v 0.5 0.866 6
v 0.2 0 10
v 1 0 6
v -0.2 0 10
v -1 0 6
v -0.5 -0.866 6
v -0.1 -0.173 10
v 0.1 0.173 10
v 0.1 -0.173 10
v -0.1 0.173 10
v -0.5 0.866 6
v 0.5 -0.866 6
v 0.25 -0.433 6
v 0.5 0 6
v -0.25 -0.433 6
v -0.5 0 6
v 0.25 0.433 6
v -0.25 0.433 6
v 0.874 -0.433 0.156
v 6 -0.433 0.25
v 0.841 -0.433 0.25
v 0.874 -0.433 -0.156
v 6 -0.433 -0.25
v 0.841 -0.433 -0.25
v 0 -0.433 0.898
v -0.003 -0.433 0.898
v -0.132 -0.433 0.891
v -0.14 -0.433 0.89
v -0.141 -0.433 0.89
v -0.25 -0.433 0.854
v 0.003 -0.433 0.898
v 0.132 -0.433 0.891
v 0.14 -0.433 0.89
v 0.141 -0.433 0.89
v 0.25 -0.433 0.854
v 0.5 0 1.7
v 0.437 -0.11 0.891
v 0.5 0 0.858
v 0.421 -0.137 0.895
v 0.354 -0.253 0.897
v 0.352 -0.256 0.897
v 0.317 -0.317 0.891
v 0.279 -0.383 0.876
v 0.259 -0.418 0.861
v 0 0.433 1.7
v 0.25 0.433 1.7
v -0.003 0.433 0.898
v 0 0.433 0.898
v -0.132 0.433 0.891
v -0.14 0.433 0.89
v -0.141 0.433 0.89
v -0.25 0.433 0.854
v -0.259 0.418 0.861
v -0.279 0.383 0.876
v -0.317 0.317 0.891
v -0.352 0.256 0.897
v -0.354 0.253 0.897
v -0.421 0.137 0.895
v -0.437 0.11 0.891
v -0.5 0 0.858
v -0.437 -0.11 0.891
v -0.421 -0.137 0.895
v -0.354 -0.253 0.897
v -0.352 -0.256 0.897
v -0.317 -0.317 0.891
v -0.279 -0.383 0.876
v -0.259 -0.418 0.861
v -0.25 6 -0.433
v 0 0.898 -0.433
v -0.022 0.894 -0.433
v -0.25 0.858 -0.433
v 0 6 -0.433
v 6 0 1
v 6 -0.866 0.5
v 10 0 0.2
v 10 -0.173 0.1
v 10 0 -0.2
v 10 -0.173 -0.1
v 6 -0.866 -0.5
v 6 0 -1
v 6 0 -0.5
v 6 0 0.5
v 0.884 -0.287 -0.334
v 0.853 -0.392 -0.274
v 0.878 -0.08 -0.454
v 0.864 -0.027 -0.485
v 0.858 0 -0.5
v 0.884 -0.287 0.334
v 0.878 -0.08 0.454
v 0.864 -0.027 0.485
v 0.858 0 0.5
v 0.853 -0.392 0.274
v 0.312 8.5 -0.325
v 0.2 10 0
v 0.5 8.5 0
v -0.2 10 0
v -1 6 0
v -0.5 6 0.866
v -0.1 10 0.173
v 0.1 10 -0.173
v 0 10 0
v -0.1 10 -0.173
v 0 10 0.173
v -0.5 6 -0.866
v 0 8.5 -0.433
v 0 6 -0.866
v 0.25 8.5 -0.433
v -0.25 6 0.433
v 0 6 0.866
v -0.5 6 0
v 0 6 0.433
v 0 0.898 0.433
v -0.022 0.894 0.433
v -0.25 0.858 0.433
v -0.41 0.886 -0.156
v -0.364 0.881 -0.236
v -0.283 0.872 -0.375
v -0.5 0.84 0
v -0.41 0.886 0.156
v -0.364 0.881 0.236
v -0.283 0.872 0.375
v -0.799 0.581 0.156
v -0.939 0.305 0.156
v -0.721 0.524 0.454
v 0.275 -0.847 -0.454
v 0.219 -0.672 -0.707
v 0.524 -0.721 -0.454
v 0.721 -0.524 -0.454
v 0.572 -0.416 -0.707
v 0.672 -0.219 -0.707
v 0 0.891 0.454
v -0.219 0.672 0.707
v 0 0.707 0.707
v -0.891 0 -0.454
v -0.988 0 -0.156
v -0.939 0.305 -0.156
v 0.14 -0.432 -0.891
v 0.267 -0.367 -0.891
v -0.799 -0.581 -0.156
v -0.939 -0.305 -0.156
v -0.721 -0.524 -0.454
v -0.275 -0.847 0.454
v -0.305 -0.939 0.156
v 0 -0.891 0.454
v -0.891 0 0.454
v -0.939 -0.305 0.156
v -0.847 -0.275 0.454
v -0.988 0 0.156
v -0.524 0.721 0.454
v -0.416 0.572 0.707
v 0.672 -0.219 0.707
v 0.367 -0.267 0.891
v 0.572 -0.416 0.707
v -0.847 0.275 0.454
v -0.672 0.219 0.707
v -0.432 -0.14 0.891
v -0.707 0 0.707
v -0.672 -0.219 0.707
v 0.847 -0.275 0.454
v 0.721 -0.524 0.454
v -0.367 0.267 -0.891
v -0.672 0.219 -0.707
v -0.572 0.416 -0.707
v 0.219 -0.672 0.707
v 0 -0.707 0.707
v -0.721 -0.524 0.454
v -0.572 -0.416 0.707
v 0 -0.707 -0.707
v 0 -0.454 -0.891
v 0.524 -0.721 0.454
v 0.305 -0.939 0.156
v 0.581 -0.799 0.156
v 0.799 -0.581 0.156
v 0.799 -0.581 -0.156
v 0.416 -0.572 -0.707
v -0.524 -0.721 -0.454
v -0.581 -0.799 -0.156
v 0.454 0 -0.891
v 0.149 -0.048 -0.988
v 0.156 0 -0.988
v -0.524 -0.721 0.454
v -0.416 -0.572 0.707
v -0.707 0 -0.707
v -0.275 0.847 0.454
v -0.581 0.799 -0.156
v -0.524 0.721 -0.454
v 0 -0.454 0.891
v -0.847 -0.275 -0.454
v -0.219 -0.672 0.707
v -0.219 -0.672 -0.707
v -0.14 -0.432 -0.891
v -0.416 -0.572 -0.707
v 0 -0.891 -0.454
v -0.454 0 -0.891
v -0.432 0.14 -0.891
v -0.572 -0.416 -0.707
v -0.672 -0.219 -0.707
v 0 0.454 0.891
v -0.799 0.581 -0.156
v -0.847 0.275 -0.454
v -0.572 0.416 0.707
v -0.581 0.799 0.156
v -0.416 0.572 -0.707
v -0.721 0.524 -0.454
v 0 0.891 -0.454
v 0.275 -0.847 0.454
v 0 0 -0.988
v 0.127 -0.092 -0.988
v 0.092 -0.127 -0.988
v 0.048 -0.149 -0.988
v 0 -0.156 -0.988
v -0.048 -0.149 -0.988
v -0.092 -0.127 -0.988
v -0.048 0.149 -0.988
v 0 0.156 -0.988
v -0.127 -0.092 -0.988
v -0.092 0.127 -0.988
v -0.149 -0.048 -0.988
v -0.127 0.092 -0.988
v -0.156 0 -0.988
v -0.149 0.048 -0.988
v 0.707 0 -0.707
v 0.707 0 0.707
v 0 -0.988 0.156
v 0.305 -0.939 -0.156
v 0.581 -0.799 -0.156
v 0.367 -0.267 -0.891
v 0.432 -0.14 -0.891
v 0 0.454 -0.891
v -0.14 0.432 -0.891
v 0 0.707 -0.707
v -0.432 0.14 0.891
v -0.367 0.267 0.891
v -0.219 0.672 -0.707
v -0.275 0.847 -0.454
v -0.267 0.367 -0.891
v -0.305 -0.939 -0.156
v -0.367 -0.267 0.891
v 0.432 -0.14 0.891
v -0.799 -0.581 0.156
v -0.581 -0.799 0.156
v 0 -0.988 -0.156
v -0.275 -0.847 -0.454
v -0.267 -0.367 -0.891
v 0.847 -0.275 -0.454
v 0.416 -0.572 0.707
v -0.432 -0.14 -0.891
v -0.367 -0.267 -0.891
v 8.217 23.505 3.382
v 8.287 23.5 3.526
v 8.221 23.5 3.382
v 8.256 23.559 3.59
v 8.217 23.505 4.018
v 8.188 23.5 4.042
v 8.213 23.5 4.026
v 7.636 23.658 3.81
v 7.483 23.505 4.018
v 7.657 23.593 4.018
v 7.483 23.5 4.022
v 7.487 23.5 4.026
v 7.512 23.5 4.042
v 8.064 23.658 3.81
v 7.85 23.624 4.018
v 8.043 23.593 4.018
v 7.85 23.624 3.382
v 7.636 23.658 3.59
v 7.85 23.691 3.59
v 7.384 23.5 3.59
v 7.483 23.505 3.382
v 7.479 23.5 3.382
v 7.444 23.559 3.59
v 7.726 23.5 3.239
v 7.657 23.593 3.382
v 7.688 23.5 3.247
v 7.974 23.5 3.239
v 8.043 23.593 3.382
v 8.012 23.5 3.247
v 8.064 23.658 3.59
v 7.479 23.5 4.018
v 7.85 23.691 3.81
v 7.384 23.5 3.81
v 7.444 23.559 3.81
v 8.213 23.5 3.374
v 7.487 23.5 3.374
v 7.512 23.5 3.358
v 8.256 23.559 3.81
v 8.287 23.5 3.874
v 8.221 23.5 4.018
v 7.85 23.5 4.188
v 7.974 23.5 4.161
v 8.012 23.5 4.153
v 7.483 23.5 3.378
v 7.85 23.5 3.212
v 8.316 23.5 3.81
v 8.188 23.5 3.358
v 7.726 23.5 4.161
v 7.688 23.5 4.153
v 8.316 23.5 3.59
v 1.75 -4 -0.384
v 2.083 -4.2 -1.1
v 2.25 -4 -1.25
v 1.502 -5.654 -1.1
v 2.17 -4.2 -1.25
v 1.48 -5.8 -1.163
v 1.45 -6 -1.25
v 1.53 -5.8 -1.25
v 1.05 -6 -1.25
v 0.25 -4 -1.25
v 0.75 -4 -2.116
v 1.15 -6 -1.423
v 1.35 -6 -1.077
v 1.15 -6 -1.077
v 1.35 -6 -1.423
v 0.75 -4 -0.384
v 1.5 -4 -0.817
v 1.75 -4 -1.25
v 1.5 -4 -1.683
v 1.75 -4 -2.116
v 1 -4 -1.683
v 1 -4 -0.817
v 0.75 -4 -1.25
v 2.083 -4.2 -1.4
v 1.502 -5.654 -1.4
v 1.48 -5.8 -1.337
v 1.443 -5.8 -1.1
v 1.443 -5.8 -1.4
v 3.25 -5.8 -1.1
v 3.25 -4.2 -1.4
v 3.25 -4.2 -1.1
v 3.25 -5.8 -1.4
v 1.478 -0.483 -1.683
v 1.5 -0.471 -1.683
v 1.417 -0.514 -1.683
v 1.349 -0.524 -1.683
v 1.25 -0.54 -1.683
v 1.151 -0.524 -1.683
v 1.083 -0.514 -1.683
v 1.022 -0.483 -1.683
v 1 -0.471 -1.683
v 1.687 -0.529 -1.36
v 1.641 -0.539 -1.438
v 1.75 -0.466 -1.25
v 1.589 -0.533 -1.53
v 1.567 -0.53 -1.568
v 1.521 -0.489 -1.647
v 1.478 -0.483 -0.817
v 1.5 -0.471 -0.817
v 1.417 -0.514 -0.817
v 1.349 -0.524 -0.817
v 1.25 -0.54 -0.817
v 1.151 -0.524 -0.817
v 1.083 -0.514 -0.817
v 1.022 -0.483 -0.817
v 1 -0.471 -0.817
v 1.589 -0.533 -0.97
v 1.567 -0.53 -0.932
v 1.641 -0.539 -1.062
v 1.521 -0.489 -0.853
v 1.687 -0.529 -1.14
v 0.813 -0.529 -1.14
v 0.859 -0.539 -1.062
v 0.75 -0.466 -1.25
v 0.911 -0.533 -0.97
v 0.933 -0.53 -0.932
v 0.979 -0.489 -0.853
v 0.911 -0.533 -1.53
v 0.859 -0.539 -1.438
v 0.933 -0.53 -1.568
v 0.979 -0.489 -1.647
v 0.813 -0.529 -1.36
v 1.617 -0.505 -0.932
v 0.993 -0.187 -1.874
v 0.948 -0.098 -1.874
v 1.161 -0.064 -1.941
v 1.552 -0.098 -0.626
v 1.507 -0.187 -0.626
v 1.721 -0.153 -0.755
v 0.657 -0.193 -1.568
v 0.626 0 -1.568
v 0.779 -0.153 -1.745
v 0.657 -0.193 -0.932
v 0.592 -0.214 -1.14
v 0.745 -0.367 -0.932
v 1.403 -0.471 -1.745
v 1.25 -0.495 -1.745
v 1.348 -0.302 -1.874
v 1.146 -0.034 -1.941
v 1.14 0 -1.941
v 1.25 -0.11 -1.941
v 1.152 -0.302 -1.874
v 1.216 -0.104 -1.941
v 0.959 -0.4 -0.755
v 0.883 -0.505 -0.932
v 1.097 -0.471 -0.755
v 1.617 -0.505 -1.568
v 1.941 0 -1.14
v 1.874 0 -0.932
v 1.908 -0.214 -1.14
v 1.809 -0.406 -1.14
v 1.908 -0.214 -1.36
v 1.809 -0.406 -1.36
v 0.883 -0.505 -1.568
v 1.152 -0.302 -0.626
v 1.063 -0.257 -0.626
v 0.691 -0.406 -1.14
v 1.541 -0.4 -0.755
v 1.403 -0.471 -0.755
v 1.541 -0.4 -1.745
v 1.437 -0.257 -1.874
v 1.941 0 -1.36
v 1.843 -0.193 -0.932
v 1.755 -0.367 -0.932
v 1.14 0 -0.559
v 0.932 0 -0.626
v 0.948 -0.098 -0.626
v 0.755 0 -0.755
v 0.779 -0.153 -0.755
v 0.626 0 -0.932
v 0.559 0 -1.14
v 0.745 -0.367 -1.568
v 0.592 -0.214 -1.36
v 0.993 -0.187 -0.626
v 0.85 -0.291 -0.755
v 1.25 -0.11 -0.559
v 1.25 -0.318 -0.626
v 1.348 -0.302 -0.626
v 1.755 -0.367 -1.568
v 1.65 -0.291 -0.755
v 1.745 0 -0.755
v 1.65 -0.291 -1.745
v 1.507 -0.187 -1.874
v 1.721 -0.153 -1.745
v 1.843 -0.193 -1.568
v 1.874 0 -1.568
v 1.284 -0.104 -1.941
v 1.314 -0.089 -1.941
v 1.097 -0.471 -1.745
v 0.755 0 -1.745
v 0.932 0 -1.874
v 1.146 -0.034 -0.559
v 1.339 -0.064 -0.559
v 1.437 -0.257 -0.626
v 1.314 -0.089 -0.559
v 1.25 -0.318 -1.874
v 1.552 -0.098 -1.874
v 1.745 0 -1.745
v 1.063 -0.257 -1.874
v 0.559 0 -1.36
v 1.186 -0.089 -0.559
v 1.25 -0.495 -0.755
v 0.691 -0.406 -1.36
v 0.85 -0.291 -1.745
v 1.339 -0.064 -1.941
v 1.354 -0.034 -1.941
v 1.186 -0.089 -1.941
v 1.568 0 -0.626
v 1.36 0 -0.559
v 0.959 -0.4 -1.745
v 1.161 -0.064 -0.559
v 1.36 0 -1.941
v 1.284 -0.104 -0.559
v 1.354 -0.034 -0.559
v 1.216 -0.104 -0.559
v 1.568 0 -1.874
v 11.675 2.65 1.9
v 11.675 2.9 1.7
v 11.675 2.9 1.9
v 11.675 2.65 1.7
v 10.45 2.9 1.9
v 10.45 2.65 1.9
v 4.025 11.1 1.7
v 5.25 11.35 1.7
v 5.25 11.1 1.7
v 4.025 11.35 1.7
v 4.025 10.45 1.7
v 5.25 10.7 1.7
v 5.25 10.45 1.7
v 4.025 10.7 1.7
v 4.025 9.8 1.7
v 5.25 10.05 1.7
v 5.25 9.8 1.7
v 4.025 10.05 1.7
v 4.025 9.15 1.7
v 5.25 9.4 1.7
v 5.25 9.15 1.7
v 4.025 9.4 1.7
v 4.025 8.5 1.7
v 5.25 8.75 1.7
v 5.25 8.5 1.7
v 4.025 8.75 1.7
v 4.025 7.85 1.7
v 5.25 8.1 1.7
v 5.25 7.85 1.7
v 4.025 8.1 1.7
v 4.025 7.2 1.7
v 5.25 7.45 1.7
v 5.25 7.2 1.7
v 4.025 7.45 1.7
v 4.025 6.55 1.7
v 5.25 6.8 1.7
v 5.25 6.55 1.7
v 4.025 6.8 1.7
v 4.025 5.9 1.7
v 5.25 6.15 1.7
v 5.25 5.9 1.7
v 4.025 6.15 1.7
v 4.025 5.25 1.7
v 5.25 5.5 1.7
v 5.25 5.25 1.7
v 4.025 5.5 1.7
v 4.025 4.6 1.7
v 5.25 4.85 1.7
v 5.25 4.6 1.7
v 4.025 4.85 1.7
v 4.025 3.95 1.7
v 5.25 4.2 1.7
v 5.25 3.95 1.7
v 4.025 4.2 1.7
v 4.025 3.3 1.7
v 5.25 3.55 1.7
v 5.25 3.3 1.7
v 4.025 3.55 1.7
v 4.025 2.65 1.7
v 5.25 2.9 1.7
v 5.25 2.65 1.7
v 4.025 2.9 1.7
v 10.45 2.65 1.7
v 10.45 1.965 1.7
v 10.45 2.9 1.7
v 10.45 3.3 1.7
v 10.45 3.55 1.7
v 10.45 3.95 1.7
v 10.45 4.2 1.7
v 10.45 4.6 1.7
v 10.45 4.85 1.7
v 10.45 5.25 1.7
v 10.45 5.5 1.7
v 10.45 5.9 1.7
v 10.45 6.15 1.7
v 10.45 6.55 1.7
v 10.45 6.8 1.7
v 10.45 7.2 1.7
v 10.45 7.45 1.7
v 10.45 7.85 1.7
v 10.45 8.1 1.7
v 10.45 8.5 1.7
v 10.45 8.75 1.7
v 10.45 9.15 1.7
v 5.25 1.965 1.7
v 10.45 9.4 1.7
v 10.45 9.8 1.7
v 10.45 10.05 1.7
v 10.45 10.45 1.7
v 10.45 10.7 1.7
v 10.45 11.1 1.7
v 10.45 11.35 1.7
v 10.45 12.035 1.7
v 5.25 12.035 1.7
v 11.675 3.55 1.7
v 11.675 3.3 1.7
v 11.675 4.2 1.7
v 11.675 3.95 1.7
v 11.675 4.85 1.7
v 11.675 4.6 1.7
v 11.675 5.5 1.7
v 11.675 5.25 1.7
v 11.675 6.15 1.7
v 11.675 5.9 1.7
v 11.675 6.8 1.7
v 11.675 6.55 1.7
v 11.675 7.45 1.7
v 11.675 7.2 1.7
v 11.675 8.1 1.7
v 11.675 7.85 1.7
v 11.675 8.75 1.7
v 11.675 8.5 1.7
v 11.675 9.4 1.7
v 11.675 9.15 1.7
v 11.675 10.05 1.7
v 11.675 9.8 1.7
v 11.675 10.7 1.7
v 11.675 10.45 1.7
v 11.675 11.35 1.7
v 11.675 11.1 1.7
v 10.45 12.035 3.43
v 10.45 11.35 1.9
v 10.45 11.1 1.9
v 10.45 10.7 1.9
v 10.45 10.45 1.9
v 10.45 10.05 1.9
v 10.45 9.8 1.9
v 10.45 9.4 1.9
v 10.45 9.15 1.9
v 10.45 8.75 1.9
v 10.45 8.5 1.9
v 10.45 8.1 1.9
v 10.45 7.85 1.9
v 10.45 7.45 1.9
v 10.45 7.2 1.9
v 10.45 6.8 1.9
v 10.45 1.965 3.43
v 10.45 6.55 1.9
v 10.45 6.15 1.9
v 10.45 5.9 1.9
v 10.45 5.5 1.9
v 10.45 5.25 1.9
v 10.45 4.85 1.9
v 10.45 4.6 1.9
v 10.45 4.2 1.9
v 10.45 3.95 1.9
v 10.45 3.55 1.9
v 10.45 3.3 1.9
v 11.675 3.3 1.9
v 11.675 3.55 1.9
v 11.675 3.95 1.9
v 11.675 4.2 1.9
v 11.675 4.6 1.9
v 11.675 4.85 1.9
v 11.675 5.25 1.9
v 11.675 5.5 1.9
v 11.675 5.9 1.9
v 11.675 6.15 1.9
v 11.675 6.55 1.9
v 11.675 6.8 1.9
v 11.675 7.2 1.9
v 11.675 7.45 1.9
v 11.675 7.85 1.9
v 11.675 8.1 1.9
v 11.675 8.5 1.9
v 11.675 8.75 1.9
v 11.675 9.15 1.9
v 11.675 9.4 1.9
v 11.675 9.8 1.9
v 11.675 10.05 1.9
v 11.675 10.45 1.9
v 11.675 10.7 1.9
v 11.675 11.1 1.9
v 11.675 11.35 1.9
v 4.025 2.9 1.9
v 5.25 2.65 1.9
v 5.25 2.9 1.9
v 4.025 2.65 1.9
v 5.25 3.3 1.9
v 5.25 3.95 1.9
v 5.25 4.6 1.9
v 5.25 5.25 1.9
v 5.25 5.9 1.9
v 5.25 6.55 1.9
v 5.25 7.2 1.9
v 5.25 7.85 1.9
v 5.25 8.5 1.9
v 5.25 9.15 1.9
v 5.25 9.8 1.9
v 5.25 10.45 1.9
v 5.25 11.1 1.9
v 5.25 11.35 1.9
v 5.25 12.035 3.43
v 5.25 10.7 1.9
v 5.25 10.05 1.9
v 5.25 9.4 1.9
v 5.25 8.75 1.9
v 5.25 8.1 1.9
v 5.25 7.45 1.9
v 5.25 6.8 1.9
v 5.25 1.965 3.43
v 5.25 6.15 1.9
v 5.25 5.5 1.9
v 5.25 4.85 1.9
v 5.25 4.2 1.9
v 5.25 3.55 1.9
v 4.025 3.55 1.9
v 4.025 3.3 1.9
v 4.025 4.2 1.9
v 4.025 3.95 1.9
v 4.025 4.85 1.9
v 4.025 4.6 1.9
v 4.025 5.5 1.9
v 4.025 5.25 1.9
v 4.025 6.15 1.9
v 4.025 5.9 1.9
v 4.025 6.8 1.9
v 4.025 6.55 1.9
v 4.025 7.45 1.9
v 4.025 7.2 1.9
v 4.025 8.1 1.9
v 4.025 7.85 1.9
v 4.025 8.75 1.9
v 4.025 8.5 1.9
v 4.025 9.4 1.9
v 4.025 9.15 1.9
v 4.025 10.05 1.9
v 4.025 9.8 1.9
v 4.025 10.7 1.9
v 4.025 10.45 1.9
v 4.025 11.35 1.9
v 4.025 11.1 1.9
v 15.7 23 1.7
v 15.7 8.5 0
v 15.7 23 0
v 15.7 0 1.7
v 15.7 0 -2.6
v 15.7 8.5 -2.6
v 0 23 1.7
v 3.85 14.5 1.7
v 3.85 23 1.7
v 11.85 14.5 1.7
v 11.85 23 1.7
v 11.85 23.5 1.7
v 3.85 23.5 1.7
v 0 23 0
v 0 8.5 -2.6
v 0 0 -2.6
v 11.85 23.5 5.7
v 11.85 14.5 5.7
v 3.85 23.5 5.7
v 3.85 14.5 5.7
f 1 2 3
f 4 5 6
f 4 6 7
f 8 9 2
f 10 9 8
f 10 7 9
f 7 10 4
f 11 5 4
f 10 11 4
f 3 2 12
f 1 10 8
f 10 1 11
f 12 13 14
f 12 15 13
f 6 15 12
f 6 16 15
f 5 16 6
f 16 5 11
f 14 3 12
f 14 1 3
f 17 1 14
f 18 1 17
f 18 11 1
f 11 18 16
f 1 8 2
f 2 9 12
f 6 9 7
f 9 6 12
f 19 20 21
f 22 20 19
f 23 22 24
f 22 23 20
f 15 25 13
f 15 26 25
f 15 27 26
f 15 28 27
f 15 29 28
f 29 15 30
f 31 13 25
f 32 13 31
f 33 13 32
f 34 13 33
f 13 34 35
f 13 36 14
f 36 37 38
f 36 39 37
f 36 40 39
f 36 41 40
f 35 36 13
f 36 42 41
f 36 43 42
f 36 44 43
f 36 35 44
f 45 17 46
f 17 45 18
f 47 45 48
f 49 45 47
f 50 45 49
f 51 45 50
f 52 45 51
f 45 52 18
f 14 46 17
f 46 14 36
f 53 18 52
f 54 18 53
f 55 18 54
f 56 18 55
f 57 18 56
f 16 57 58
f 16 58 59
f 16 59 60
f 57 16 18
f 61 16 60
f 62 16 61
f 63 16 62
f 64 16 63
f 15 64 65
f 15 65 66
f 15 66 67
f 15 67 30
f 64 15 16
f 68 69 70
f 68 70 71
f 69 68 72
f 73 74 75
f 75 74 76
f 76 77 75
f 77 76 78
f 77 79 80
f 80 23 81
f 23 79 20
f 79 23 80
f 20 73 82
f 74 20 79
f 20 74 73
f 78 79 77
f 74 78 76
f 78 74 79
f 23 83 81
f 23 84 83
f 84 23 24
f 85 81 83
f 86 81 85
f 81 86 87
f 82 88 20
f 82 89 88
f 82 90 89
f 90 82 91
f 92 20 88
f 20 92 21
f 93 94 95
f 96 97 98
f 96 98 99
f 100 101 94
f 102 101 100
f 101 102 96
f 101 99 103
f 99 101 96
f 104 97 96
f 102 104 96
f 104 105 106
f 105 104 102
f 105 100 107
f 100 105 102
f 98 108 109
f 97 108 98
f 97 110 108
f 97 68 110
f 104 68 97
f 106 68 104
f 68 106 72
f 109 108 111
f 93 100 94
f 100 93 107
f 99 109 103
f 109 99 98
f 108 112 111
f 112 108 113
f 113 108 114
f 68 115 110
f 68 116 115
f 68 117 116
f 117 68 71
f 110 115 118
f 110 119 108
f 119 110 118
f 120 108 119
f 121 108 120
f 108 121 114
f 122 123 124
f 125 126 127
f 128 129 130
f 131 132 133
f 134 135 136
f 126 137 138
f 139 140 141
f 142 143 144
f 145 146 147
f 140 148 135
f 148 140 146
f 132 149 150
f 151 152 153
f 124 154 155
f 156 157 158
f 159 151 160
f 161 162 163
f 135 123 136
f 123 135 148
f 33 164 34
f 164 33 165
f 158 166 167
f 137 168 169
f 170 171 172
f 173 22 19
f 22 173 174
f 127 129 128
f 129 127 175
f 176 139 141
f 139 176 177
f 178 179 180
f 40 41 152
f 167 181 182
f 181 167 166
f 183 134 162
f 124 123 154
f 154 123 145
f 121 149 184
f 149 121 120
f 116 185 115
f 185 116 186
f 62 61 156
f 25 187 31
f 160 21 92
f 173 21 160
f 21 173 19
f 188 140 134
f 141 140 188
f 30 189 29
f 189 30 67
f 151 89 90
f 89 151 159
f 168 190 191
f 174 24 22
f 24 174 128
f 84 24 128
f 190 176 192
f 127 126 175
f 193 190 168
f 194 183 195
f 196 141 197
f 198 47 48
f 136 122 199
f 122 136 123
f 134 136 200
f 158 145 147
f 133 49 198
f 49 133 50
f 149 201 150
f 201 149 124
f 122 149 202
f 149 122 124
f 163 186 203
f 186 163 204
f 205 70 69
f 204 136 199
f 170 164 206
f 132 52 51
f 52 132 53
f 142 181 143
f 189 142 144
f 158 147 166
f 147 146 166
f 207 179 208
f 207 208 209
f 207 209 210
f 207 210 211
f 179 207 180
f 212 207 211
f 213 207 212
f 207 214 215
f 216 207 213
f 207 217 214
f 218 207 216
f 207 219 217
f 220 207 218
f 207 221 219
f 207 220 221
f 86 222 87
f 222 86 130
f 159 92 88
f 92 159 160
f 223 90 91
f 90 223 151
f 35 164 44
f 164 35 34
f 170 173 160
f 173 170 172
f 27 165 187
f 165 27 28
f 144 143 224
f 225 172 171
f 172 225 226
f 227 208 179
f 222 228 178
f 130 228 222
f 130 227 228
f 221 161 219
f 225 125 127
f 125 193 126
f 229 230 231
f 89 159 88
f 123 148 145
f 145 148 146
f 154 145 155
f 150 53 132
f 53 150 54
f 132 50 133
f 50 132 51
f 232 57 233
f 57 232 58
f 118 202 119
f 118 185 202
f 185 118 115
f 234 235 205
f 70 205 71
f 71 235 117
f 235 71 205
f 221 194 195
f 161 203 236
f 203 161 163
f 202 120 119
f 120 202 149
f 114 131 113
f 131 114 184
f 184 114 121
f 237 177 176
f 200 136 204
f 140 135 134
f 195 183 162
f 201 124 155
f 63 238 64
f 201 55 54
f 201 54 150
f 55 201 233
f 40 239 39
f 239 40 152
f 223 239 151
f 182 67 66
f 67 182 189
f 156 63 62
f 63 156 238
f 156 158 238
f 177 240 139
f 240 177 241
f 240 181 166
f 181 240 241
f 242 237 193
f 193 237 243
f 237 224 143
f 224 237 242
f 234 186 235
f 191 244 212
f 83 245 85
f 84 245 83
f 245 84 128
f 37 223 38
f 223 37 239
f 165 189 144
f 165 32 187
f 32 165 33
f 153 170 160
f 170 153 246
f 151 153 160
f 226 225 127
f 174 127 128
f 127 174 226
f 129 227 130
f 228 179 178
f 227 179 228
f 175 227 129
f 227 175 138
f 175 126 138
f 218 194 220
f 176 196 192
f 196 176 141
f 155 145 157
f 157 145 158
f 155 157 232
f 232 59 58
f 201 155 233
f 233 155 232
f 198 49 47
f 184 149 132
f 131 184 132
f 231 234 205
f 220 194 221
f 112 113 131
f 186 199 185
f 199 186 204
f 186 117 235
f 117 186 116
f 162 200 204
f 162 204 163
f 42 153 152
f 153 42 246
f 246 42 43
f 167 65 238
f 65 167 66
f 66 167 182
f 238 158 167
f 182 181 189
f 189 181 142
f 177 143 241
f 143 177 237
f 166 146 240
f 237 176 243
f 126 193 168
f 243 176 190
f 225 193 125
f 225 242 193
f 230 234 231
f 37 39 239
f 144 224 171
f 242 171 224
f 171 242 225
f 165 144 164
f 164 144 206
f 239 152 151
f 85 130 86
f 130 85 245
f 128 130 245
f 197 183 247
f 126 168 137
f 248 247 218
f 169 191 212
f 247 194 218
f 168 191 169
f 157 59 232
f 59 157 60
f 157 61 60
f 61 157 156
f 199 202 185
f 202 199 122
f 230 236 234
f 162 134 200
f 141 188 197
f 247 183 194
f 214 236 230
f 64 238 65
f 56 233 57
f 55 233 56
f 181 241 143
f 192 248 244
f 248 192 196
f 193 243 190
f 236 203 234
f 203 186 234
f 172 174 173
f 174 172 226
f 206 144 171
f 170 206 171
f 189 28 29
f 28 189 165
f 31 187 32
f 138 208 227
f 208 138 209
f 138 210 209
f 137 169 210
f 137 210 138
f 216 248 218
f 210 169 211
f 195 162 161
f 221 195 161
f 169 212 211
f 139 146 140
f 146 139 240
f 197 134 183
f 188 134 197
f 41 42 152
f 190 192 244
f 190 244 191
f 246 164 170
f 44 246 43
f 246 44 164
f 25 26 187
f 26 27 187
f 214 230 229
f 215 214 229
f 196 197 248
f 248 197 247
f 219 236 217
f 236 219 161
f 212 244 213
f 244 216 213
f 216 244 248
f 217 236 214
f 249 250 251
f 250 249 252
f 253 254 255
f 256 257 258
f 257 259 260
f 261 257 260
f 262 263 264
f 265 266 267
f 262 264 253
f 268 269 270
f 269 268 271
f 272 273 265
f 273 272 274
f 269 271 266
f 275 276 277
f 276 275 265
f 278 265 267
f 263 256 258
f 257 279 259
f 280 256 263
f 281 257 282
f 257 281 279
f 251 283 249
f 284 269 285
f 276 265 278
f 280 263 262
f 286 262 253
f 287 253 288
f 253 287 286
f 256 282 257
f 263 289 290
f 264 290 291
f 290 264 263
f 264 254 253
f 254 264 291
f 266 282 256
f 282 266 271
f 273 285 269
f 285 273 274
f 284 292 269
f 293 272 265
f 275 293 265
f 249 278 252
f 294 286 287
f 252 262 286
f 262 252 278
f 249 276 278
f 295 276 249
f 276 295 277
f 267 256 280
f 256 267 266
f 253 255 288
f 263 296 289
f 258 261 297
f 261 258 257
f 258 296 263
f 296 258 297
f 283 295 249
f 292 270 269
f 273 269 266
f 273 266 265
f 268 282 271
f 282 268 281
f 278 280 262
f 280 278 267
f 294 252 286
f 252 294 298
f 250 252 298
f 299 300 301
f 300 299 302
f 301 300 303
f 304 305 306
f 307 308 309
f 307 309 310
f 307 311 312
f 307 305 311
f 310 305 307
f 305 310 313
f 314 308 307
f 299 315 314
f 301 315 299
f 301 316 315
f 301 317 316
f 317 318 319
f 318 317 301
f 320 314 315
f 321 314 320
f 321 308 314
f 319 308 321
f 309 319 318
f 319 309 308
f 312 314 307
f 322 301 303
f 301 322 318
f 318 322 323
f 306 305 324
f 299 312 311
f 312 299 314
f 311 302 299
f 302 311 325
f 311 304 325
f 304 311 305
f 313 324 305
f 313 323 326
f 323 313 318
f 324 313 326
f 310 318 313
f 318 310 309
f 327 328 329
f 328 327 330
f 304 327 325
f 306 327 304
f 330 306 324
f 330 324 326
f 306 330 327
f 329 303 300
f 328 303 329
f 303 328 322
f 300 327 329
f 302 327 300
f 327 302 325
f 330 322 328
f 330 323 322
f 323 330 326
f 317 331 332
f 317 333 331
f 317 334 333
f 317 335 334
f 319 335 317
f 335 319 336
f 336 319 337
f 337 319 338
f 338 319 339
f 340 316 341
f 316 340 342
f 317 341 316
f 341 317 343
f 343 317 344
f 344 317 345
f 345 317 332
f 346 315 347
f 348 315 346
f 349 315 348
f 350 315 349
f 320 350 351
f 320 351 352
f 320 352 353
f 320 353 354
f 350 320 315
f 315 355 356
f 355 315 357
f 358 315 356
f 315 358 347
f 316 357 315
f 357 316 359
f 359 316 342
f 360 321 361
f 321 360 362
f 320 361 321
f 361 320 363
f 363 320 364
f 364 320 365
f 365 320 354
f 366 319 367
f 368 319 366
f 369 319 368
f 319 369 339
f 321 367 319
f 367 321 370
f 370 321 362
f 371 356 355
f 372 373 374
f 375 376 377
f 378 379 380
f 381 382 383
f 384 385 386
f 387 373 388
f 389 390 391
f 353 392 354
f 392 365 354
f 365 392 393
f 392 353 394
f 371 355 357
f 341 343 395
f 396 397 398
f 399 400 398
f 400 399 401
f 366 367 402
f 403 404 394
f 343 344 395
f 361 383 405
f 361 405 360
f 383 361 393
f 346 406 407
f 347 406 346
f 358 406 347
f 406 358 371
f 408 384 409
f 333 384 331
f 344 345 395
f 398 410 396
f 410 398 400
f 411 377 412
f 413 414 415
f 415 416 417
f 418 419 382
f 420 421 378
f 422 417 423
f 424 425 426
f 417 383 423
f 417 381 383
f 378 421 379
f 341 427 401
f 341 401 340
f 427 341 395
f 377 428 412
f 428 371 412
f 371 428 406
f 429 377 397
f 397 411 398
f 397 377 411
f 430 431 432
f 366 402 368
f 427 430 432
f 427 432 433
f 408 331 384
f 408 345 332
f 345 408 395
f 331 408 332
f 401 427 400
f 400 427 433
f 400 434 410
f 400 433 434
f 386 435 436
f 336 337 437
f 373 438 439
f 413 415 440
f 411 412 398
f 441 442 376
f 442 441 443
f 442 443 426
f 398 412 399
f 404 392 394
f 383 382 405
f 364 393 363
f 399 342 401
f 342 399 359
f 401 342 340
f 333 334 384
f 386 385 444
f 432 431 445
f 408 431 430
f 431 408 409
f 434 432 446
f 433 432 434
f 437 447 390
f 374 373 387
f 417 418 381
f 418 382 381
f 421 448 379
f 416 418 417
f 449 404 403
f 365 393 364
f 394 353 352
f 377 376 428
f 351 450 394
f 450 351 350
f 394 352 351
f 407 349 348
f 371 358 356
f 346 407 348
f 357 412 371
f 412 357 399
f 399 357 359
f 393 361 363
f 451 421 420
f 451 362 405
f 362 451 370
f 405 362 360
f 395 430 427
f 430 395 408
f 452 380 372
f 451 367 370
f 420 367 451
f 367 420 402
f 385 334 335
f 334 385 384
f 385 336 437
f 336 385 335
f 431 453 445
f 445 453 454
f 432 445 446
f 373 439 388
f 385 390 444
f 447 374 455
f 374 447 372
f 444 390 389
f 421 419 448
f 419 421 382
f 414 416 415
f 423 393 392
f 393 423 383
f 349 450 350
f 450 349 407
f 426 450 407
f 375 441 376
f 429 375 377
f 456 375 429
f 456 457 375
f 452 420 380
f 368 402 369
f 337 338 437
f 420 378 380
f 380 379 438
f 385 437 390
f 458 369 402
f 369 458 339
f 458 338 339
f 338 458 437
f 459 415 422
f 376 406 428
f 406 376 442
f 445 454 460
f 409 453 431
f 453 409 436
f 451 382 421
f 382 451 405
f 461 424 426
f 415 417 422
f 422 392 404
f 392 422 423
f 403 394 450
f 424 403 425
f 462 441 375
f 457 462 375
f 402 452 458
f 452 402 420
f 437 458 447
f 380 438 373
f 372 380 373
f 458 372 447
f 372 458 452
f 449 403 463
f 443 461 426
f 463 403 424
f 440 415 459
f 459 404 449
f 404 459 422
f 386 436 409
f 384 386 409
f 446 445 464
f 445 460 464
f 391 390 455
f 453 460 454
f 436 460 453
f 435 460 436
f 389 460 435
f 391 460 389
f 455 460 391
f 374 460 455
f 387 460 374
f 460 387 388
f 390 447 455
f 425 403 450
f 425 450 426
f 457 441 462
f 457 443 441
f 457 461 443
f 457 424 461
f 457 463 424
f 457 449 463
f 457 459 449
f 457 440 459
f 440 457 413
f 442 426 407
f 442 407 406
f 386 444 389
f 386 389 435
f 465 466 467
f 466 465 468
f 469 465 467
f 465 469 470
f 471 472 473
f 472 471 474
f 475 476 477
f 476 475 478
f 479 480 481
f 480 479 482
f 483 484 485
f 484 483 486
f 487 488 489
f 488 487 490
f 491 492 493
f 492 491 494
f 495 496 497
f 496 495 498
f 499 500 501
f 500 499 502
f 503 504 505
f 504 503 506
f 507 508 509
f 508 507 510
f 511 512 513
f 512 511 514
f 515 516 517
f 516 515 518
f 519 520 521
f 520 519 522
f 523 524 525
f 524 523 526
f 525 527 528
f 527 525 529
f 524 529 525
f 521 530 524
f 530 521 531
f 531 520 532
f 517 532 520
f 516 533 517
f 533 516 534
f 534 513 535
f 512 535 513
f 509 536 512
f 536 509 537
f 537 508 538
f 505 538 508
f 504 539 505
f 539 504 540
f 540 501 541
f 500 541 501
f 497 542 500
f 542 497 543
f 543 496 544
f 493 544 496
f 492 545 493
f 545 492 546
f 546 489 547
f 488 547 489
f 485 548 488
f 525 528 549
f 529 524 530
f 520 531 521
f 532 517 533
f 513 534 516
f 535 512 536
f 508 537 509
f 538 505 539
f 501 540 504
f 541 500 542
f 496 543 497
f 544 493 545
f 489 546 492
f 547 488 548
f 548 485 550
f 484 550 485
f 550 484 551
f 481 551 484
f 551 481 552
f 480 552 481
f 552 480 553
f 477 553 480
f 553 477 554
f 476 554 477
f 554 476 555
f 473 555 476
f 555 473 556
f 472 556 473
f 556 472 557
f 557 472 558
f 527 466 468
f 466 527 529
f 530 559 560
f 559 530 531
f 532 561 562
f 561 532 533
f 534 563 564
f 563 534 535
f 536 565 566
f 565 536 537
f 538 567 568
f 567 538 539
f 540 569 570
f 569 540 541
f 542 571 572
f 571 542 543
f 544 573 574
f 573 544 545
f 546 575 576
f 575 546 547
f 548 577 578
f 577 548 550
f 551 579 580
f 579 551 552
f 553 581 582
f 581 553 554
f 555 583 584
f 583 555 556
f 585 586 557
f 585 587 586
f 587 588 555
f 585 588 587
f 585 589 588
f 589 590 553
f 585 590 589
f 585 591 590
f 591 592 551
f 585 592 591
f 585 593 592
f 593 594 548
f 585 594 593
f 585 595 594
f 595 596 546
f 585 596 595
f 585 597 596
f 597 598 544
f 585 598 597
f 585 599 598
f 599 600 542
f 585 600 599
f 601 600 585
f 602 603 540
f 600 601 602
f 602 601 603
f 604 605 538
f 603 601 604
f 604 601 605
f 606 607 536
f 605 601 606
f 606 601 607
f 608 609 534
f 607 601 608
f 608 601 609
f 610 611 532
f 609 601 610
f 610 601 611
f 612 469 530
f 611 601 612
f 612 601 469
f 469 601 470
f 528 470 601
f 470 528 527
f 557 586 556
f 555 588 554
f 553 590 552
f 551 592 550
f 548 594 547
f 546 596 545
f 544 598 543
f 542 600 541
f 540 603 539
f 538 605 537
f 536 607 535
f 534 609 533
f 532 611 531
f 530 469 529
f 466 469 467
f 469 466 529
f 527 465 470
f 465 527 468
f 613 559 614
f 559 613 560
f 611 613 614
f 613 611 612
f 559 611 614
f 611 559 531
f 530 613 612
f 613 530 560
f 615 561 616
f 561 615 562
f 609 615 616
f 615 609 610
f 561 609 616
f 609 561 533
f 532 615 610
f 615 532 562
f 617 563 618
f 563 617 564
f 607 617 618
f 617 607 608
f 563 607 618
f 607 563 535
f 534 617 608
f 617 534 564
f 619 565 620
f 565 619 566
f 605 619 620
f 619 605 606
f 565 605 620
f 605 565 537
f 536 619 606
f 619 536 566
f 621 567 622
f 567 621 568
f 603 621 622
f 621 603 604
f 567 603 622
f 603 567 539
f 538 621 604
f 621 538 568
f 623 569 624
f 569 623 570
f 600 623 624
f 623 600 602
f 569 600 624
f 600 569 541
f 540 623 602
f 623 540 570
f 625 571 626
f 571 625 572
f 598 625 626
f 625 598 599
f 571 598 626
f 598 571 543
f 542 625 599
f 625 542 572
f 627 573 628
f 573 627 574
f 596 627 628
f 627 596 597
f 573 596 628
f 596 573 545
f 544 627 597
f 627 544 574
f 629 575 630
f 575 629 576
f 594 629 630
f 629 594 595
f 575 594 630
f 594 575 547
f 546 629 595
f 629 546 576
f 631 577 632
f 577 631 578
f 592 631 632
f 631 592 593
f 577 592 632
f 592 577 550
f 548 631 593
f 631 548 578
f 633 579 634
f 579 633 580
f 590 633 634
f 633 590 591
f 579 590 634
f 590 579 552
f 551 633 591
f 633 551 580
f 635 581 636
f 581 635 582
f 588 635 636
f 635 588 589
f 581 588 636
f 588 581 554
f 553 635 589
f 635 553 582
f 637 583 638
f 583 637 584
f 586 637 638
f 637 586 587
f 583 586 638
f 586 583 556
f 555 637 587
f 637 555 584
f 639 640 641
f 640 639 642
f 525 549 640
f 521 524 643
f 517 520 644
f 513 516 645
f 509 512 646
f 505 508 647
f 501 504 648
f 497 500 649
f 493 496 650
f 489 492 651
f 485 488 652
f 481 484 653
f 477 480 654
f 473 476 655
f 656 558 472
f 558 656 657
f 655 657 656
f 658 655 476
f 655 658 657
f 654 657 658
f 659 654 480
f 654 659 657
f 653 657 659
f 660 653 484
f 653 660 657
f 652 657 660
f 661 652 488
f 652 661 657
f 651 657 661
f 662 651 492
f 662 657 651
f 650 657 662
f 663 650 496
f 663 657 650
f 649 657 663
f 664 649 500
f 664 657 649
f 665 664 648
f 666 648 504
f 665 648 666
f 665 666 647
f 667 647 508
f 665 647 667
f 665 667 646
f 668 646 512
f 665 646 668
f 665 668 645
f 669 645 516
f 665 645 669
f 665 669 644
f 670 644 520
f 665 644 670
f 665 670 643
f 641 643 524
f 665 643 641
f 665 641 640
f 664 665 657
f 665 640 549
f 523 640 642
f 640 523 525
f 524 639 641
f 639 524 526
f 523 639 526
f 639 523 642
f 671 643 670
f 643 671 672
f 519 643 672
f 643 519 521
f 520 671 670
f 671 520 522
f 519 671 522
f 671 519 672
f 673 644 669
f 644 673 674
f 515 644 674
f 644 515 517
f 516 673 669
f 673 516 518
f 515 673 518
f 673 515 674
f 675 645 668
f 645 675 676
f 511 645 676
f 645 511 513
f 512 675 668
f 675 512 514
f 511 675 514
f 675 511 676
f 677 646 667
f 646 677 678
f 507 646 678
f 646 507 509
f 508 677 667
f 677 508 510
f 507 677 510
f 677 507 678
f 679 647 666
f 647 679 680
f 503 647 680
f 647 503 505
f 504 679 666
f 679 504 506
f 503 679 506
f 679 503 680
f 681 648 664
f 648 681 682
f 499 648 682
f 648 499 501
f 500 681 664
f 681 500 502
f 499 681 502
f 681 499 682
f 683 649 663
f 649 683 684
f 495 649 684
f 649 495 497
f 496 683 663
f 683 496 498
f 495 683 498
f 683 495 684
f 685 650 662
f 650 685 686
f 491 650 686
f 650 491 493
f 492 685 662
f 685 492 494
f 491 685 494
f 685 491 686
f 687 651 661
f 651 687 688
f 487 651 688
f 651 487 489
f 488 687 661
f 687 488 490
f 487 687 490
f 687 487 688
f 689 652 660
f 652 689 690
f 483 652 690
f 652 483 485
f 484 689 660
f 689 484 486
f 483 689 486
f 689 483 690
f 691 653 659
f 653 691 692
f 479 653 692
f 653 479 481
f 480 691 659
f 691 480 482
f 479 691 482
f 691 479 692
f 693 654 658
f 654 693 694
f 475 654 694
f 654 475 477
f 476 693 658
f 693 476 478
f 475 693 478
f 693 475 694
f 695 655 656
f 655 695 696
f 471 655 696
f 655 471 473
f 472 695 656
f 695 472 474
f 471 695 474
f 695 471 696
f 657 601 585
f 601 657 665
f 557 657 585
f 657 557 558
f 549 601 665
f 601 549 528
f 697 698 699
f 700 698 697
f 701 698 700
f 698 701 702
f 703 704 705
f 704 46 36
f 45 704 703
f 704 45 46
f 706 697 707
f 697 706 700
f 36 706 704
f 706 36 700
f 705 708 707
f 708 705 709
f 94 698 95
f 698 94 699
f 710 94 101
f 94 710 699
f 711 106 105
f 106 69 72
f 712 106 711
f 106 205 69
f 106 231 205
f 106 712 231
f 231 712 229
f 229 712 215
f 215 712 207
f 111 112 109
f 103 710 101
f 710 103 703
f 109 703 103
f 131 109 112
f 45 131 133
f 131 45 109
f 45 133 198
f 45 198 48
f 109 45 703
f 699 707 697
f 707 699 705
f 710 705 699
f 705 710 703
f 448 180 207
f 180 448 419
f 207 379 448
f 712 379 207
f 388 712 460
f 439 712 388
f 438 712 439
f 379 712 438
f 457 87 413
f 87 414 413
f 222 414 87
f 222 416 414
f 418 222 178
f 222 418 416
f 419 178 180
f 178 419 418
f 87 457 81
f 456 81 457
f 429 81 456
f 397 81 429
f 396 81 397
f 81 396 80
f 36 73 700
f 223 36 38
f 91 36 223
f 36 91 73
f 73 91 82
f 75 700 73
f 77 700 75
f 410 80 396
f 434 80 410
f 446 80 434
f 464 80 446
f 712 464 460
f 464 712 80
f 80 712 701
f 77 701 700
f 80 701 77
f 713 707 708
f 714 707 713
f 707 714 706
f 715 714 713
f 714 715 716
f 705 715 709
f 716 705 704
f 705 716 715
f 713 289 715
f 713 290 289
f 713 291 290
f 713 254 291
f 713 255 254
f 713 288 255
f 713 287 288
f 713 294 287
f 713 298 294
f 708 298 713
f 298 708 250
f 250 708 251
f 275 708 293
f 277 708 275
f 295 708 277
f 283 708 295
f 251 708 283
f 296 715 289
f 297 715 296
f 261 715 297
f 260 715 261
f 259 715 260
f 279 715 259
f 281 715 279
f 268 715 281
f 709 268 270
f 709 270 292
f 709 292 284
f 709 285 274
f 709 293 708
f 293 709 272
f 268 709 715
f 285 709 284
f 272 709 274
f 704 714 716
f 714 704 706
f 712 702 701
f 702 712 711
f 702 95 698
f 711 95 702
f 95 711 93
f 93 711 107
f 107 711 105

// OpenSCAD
include <../config/config.scad>

include <../vitamins/FTDIBreakout.scad>

DebugConnectors=true;
DebugCoordinateFrame=true;

FTDIBreakout();
